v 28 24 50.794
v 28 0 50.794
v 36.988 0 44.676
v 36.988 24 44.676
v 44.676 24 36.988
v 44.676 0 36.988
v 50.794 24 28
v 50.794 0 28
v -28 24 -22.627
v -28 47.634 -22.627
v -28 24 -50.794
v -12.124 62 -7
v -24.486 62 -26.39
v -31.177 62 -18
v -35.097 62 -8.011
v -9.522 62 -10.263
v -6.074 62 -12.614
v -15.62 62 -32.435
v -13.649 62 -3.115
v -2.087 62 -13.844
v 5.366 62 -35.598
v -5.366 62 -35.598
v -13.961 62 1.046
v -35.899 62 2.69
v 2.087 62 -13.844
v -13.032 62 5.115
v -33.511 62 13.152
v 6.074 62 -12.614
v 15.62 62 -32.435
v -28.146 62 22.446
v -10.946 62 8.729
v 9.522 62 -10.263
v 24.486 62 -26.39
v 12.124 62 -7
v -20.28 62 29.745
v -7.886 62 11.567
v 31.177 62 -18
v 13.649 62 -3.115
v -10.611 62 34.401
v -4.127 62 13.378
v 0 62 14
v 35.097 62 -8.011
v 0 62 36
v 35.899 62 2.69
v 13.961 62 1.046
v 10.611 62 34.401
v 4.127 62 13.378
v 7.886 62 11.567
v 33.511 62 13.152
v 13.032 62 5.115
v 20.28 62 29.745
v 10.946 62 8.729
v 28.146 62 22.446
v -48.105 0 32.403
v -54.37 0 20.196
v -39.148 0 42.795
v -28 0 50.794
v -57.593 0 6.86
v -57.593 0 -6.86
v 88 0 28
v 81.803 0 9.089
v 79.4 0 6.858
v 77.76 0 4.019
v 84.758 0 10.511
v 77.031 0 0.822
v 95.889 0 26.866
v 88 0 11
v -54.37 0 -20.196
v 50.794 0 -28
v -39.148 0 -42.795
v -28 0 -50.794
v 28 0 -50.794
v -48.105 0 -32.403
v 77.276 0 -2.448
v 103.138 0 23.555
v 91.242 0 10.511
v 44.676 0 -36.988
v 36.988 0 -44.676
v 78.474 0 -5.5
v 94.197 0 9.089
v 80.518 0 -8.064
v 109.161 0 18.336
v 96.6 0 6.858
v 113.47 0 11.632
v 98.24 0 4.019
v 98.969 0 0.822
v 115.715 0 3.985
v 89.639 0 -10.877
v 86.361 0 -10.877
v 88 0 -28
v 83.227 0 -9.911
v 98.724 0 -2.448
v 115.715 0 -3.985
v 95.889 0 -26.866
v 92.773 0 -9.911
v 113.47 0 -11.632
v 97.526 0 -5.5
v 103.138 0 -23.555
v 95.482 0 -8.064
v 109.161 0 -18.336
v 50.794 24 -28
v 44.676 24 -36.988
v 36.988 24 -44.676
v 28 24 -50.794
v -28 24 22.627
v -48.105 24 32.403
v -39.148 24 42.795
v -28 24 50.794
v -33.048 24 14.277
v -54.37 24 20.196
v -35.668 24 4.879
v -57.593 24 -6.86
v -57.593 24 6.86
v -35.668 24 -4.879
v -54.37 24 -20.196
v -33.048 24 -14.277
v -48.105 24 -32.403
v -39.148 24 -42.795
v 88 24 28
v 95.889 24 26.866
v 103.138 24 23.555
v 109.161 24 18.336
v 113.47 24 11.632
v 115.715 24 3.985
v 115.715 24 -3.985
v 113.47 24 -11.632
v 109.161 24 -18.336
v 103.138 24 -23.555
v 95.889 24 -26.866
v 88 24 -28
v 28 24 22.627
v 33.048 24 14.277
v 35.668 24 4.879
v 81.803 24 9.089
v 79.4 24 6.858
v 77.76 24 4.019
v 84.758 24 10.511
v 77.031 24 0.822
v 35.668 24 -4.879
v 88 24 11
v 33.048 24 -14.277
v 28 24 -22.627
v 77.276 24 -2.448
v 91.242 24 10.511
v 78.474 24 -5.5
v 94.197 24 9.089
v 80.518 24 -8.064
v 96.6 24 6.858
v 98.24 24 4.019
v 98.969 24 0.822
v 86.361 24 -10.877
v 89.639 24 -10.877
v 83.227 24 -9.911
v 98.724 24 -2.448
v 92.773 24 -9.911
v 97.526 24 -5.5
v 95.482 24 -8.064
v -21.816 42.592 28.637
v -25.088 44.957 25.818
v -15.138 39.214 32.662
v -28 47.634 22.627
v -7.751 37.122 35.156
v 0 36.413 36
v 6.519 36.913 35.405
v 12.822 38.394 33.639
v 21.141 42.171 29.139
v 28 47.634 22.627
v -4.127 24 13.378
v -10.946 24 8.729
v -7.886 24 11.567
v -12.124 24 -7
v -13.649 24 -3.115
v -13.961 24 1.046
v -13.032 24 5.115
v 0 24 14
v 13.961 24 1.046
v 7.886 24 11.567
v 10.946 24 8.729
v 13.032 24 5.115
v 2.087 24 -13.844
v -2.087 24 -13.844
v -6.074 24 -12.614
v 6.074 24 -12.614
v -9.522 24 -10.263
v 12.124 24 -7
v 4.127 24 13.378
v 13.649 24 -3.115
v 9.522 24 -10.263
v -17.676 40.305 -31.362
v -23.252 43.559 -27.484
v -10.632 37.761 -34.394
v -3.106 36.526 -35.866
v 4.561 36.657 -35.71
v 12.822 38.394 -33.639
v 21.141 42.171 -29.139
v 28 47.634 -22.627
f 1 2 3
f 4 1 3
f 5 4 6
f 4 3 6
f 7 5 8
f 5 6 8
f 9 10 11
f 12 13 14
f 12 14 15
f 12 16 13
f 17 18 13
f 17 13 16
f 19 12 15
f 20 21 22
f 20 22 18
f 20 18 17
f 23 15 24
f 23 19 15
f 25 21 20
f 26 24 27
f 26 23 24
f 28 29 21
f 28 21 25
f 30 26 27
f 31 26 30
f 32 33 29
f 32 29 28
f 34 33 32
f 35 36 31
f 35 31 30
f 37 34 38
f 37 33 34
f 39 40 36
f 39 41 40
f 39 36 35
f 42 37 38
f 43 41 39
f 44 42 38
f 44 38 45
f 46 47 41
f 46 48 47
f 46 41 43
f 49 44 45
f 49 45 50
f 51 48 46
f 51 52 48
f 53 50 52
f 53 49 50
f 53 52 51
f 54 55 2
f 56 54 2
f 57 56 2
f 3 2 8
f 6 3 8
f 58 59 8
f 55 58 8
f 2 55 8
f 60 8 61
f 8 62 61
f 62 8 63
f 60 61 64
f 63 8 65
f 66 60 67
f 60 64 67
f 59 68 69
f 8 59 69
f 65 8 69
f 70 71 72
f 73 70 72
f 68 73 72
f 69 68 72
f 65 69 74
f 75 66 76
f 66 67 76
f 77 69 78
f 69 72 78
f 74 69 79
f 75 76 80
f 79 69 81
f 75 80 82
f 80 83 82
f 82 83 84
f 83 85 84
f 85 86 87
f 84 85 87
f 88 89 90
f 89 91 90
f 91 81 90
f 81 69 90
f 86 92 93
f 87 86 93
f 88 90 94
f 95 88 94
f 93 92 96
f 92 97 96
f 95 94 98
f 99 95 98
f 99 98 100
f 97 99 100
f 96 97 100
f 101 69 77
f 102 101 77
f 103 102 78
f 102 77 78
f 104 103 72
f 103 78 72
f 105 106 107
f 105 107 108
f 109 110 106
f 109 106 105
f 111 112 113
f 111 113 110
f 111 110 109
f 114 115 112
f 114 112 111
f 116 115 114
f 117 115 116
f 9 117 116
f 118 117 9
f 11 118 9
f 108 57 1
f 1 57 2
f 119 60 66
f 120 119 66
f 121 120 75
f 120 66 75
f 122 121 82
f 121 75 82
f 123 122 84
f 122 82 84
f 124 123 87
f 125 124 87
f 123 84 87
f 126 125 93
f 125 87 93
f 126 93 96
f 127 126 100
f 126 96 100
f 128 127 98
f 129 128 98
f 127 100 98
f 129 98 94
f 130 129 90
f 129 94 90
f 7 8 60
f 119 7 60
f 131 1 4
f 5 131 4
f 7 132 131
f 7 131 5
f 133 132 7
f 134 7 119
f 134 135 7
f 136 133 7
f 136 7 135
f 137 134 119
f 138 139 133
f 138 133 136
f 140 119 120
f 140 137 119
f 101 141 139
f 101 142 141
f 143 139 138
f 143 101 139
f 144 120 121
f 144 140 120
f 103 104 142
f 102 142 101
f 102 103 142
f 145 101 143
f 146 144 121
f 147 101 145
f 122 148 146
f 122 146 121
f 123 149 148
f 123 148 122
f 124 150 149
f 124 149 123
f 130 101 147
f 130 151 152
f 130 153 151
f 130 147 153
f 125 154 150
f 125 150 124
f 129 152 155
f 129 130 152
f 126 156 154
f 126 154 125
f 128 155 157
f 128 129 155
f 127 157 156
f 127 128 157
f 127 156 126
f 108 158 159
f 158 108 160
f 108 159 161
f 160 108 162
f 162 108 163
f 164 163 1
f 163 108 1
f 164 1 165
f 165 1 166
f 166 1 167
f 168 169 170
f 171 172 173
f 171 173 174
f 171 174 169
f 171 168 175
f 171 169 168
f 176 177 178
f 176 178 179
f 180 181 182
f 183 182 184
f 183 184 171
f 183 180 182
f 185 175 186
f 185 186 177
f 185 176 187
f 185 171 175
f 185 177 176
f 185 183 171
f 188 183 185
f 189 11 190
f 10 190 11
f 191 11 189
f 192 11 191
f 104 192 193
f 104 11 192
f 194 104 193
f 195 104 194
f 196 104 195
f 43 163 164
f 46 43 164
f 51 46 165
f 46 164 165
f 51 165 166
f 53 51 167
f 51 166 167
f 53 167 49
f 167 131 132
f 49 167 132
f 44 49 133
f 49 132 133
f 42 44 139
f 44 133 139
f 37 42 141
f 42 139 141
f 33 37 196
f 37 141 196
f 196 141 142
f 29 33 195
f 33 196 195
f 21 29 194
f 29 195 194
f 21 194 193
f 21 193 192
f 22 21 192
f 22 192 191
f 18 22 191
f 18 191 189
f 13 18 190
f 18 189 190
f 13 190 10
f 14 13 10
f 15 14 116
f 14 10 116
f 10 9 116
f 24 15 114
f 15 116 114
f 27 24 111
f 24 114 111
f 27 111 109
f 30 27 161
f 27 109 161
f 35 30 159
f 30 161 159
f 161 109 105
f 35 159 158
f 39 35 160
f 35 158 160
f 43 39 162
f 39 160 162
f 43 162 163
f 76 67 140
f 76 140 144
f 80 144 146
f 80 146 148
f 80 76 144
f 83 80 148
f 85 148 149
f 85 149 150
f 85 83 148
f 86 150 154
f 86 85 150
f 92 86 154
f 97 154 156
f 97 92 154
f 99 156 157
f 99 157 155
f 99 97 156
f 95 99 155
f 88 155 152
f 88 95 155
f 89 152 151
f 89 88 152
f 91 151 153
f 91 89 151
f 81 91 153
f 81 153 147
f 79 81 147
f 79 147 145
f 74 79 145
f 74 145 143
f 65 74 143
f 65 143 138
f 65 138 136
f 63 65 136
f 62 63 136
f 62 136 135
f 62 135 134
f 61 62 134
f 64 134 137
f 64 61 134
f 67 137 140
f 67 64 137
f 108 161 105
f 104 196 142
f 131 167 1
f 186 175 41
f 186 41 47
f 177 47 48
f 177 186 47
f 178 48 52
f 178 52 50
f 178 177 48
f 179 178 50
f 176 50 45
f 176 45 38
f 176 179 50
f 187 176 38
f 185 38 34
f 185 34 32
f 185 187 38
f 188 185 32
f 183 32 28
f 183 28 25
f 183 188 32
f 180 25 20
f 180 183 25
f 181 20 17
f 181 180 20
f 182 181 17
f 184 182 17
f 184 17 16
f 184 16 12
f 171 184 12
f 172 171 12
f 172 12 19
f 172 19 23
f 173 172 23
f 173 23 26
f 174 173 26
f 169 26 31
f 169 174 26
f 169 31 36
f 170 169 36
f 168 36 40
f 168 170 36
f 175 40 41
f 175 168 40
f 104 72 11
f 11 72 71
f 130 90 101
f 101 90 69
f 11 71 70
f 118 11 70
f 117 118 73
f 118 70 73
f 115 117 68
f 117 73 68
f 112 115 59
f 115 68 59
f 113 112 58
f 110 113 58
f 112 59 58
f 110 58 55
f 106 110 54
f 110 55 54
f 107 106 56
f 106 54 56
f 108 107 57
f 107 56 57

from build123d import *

# Parameters (mm, degrees)
SKETCH1_R          = 11
BASE_DEPTH         = 24
SKETCH2_R          = 36
SKETCH2_R_2        = 14
TOP_CYLINDER_DEPTH = 38
SIDE_ARMS_DEPTH    = 56


with BuildPart() as part:
    # Sketch1 → base (new body)
    with BuildSketch(Plane(origin=(0, 0, 0), x_dir=(1, 0, 0), z_dir=(0, 1, 0))):
        with BuildLine():
            Line((-28, -50.793700397), (28, -50.793700397))
            ThreePointArc((28, -50.793700397), (41.012193309, -41.012193309), (50.793700397, -28))
            Line((50.793700397, -28), (88, -28))
            ThreePointArc((88, -28), (116, 0), (88, 28))
            Line((88, 28), (50.793700397, 28))
            ThreePointArc((50.793700397, 28), (41.012193309, 41.012193309), (28, 50.793700397))
            Line((28, 50.793700397), (-28, 50.793700397))
            ThreePointArc((-28, 50.793700397), (-58, 0), (-28, -50.793700397))
        make_face()
        with Locations(Location((88, 0, 0), (0, 0, 270))):
            Circle(SKETCH1_R, mode=Mode.SUBTRACT)
    extrude(amount=BASE_DEPTH)

    # Sketch2 → top cylinder (add)
    with BuildSketch(Plane(origin=(0, 24, 0), x_dir=(1, 0, 0), z_dir=(0, 1, 0))):
        with Locations(Location((0, 0, 0), (0, 0, 270))):
            Circle(SKETCH2_R)
        with Locations(Location((0, 0, 0), (0, 0, 270))):
            Circle(SKETCH2_R_2, mode=Mode.SUBTRACT)
    extrude(amount=TOP_CYLINDER_DEPTH)

    # 3DSketch1 → side arms (add)
    with BuildSketch(Plane(origin=(28, 24, 50.793700397), x_dir=(0, 0, -1), z_dir=(1, 0, 0))):
        Polygon((0, 0), (28.166283399, 23.634318012), (28.166283399, 0), align=None)
        Polygon((101.587400794, 0), (73.421117395, 23.634318012), (73.421117395, 0), align=None)
    extrude(amount=-SIDE_ARMS_DEPTH)


solid = part.part
